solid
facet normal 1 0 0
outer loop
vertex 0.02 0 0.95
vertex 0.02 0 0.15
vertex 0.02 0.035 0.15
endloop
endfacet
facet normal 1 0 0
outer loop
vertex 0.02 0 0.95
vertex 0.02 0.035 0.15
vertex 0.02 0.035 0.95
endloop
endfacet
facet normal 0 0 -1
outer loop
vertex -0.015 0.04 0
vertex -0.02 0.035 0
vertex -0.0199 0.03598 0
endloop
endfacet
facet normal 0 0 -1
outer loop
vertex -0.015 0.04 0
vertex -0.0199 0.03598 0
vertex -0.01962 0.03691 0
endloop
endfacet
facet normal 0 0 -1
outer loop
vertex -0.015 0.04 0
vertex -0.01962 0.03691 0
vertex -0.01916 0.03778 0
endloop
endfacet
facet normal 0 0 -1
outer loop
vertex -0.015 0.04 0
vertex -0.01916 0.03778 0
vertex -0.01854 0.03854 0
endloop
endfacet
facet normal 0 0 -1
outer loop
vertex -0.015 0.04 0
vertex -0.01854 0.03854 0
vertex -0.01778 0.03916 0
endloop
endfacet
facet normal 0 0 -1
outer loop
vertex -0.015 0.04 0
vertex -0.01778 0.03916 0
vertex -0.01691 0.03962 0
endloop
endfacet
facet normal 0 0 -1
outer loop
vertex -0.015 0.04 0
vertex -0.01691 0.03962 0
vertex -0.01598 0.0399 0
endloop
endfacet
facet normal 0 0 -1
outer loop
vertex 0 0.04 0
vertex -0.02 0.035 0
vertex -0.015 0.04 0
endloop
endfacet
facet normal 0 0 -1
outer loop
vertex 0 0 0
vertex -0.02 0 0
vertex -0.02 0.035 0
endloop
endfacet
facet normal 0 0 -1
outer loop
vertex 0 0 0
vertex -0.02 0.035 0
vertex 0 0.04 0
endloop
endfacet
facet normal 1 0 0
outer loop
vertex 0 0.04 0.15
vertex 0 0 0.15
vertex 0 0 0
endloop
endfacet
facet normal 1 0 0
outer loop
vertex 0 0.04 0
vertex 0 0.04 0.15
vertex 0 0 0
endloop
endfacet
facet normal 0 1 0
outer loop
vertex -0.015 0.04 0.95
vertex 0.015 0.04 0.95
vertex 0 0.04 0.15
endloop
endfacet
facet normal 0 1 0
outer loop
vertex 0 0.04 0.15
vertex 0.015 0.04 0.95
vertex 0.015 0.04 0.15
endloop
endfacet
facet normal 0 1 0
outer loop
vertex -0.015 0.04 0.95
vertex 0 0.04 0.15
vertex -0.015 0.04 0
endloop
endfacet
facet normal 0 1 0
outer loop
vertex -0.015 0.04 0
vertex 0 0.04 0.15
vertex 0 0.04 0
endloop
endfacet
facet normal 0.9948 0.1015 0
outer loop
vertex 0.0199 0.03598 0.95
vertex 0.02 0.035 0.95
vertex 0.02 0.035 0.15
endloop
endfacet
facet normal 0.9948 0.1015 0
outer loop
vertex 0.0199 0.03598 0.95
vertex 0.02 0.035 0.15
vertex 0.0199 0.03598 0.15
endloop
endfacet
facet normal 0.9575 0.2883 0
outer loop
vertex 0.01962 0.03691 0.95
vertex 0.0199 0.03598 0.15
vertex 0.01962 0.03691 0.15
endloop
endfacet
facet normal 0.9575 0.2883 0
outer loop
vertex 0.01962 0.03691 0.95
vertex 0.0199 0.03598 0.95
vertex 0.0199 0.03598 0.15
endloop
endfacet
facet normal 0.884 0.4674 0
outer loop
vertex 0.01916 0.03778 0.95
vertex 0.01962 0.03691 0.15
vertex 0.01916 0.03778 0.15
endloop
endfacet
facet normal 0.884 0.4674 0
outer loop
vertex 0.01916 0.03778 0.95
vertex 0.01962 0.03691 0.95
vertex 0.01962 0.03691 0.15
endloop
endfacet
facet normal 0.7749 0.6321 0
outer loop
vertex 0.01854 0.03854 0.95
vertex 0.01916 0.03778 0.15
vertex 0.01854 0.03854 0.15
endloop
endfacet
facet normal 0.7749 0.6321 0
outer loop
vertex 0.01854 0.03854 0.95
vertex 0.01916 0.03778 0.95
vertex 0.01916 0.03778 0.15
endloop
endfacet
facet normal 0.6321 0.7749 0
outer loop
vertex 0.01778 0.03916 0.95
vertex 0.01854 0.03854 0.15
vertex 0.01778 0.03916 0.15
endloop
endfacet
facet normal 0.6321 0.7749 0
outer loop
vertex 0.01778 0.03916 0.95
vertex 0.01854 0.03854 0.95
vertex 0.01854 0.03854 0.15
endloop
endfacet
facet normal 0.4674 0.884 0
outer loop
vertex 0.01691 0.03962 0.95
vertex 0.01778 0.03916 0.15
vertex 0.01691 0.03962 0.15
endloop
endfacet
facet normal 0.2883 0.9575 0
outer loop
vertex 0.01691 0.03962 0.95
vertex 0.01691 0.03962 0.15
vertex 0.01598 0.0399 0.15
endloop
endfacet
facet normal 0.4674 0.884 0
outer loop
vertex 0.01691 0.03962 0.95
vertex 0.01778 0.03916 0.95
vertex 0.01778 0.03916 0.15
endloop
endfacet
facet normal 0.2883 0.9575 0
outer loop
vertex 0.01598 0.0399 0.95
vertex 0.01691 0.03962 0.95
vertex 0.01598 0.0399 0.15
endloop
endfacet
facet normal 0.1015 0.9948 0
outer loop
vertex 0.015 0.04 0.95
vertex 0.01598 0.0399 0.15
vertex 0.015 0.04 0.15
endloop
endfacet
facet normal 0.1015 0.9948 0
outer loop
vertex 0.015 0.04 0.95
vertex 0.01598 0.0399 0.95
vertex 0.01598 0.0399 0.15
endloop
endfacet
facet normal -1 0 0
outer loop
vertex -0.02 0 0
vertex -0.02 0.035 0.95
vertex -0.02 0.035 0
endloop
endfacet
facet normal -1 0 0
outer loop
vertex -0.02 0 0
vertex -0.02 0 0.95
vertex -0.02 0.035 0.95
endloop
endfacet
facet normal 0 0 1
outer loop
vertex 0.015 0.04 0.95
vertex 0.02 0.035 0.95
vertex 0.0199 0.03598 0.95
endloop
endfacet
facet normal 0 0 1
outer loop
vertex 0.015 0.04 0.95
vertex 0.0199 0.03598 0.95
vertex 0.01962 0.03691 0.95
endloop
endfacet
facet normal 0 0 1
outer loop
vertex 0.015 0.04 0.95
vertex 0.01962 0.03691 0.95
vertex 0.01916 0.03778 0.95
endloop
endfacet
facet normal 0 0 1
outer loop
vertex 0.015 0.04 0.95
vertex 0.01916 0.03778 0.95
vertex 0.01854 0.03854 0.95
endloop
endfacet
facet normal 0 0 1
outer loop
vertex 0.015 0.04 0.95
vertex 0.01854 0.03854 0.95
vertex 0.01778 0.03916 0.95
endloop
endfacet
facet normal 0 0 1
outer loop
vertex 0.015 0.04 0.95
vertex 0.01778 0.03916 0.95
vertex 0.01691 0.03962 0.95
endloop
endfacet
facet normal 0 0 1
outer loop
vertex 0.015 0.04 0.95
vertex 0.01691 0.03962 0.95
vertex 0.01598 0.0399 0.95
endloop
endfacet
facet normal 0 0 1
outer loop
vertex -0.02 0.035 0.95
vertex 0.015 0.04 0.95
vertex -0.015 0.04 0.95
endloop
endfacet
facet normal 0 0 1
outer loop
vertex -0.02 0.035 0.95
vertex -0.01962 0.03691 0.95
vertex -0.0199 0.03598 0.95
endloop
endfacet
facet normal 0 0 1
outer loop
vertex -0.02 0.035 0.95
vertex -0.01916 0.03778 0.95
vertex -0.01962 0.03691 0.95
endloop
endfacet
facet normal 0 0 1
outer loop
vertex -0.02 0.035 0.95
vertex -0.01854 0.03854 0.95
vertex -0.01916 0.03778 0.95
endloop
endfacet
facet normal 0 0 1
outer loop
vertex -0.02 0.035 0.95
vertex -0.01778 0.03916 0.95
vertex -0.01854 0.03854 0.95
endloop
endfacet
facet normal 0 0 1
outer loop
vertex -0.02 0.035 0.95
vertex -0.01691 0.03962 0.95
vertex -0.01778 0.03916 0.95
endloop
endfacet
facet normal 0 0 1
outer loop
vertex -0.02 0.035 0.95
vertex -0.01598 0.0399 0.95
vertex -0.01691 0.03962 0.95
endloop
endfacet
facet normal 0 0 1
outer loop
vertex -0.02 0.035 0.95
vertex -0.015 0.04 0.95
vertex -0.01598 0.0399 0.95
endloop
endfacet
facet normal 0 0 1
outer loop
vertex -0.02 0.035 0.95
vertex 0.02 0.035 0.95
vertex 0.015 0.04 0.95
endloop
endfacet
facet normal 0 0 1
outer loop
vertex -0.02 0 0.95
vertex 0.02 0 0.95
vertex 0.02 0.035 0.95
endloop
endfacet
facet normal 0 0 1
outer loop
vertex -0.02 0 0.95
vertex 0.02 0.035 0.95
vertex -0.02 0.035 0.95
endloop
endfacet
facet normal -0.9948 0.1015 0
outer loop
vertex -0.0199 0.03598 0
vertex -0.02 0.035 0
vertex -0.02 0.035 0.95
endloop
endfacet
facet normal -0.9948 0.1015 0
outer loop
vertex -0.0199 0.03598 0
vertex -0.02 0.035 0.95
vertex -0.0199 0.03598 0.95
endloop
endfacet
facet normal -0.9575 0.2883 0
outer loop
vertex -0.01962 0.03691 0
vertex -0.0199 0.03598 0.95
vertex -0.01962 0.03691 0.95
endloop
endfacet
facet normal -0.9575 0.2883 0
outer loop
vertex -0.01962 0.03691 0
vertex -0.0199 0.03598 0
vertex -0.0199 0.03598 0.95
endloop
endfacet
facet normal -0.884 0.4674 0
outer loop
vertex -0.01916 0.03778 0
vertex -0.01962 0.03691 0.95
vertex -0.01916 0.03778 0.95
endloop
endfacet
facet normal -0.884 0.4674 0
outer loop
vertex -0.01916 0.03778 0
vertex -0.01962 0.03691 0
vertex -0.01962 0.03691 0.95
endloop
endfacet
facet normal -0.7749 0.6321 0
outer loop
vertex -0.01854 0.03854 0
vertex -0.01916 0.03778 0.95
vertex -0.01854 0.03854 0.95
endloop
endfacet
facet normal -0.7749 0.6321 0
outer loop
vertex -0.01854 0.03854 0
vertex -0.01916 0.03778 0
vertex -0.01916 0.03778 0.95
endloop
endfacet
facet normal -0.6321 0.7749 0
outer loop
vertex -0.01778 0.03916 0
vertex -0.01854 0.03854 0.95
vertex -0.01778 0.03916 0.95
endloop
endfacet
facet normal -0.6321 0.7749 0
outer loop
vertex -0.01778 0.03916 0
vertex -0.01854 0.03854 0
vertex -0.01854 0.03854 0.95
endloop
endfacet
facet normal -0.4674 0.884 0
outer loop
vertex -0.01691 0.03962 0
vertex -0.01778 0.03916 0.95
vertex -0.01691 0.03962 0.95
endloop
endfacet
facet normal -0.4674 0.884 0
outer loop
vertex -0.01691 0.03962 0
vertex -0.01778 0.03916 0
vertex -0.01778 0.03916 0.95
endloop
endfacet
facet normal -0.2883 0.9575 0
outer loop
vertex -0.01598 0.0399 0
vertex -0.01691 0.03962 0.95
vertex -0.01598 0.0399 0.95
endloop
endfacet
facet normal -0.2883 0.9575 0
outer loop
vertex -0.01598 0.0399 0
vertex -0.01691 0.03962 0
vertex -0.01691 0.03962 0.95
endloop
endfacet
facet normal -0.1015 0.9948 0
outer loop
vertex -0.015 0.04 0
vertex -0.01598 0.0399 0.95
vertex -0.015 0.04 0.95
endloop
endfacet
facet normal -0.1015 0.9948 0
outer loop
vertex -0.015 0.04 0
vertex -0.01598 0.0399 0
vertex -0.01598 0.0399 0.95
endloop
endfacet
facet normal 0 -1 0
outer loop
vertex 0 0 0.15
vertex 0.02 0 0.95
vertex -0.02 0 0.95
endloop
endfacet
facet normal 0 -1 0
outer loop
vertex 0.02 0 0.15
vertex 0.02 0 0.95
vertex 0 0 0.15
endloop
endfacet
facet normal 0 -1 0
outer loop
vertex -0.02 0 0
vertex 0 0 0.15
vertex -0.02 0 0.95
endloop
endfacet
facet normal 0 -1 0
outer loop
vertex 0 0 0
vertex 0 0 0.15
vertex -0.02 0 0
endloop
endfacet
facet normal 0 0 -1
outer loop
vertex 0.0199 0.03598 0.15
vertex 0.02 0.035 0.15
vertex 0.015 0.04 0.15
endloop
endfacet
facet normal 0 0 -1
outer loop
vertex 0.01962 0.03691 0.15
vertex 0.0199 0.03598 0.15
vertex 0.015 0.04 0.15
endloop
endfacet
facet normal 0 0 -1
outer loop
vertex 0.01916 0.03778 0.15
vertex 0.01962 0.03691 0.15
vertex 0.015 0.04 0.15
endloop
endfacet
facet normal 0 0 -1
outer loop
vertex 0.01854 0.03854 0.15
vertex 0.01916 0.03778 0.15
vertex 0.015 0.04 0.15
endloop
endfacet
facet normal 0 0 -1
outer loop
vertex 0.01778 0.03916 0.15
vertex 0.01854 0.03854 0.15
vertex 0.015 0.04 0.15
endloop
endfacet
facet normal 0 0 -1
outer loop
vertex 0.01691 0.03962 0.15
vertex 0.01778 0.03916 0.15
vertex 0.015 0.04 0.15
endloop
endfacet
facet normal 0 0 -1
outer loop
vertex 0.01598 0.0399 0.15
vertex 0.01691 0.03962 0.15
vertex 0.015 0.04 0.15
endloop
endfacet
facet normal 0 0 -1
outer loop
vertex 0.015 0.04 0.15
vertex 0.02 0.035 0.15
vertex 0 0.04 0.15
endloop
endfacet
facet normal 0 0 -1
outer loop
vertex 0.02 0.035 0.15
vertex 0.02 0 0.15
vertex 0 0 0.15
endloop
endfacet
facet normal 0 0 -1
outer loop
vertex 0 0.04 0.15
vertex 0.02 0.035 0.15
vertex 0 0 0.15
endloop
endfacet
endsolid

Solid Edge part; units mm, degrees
sketch "Sketch1" plane through (0, 0, 0) normal (0, -1, 0) x (1, 0, 0)
  line L0 (-0.02, 0) -> (0, 0)
  line L1 (0, 0.15) -> (0, 0)
  line L2 (0.02, 0.15) -> (0, 0.15)
  line L3 (0.02, 0.15) -> (0.02, 0.95)
  line L4 (0.02, 0.95) -> (-0.02, 0.95)
  line L5 (-0.02, 0.95) -> (-0.02, 0)
  dimension "D1" = 0.95
  dimension "D2" = 0.04
  dimension "D3" = 0.15
extrude "Protrusion1" add sketch "Sketch1" against normal blind 0.04
fillet "Verrundung_1" radius 0.005 2 edges at (-0.02, 0.04, 0.475) (0.02, 0.04, 0.55)
